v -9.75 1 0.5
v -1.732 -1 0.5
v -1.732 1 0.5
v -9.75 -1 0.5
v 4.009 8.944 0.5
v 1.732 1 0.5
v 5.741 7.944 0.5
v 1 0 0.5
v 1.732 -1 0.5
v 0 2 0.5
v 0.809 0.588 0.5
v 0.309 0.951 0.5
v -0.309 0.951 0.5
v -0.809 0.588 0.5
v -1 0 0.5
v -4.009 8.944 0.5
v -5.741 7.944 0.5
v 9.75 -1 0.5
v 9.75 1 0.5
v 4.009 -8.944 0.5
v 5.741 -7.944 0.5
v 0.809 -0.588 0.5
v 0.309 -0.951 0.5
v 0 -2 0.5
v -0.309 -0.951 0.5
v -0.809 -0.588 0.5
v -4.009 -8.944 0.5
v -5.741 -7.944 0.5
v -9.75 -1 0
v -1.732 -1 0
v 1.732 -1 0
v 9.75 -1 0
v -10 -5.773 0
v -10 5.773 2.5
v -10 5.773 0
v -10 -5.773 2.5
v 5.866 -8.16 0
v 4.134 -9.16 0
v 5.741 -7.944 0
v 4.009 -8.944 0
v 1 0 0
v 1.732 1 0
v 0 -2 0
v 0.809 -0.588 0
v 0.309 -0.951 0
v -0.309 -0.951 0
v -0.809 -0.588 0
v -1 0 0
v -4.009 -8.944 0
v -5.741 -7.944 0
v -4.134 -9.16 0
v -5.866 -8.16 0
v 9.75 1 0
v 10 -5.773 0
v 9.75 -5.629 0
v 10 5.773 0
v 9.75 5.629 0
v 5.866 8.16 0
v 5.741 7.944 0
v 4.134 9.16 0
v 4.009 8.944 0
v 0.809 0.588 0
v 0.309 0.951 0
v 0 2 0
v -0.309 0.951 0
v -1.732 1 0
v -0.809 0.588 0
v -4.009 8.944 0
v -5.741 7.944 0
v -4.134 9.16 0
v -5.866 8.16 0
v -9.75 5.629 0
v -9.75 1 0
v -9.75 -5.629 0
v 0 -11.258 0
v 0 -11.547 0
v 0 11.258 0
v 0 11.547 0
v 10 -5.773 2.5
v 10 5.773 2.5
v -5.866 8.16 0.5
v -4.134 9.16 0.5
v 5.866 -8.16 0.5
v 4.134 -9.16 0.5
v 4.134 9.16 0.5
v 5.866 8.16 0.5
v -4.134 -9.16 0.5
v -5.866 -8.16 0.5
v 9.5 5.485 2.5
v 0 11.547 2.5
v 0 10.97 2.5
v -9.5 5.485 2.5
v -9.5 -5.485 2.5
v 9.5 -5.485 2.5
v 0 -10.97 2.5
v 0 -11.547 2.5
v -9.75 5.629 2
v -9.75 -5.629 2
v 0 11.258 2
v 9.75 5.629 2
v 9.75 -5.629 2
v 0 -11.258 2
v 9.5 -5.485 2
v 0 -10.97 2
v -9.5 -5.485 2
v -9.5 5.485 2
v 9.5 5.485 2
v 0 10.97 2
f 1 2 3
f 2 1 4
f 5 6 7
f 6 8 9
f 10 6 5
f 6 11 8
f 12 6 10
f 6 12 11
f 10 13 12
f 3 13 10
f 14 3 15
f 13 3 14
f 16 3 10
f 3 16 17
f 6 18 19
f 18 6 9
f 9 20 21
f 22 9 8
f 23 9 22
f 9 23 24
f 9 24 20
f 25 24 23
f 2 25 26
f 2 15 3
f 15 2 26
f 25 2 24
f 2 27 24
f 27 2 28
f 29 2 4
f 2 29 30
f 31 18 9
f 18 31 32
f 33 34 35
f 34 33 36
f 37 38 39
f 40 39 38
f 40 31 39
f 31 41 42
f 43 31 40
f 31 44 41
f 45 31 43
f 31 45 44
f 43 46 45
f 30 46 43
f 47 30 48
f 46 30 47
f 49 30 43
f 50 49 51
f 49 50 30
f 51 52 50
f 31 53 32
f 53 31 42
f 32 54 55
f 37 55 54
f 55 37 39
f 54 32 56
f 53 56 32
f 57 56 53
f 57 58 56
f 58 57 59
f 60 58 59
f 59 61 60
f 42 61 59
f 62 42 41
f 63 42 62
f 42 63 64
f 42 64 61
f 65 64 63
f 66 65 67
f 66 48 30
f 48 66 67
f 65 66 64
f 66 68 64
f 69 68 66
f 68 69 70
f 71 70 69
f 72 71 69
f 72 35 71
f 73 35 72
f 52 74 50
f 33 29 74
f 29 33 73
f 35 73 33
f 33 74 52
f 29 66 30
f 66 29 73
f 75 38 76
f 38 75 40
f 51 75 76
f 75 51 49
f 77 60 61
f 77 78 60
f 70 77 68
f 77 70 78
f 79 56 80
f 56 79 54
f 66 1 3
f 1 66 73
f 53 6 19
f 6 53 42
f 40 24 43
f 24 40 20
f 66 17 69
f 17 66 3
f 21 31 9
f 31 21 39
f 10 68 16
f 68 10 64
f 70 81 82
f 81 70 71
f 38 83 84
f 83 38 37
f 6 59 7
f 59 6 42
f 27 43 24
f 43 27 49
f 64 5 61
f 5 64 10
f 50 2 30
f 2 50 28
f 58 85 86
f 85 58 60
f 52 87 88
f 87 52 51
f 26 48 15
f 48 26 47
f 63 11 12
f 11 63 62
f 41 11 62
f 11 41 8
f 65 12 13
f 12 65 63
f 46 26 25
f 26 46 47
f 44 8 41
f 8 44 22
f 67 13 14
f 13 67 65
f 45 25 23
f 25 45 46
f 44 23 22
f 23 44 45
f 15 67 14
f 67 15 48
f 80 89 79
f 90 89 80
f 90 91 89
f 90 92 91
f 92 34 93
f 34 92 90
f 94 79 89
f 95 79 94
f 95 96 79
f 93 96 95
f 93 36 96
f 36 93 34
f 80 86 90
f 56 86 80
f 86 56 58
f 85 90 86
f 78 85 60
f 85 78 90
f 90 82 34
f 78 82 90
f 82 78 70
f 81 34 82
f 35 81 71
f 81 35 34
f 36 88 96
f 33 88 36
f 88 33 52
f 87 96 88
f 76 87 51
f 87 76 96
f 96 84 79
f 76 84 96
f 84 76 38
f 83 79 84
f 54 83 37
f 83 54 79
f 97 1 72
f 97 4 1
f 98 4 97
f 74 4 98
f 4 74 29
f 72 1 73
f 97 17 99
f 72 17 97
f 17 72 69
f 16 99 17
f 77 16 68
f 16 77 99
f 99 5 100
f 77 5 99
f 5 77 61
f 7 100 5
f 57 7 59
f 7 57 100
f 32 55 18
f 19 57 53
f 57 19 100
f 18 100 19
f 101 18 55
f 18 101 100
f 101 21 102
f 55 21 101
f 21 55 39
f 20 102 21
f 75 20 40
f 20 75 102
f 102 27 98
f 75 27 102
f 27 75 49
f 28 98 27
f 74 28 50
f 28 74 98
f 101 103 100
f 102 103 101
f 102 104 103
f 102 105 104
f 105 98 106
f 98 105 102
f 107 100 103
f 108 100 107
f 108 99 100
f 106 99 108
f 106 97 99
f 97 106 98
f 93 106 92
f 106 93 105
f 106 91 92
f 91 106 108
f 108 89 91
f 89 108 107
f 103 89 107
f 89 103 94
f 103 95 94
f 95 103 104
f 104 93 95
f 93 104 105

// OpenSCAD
module hexagon(r,x,y,h){
    polygon(points=[
        [(r+x),(r*(tan(30)))+y],
        [x,(r*(2/sqrt(3)))+y],
        [-r+x,(r*(tan(30)))+y],
        [-r+x,-(r*(tan(30)))+y],
        [x,-(r*(2/sqrt(3)))+y], 
        [r+x,-(r*(tan(30)))+y]]);
}

h_total = 2.5;
h_lip = .5;
r_max = 10;
r_diff = .25;
r_lip = 9.5;
b_height = .5;
b_width = 2;

module case(){
    union() difference(){
        linear_extrude(h_total){
            union() difference() {
                hexagon(r_max,0,0);
                hexagon(r_max-r_diff,0,0);
            };
        };
        backplate();
    }

    translate([0,0,h_total-h_lip]){
        linear_extrude(h_lip){
            union() difference() {
                hexagon(r_max,0,0);
                hexagon(r_lip,0,0);
            };
        };
    }
}
module backplate(){
    translate([0,0,b_height/2]){
        union() difference() {
            for ( i = [0 : 2] ){
                rotate( (i * 120)+90)
                cube([b_width, 2*r_max, b_height], true);
            };
            cylinder(h = (b_height*2)+10, r = b_width/2, center = true, $fn=10);
        };
    };
}

case();

//translate([2*r_max+1, 0, 0]){
//    backplate();
//}

backplate();
